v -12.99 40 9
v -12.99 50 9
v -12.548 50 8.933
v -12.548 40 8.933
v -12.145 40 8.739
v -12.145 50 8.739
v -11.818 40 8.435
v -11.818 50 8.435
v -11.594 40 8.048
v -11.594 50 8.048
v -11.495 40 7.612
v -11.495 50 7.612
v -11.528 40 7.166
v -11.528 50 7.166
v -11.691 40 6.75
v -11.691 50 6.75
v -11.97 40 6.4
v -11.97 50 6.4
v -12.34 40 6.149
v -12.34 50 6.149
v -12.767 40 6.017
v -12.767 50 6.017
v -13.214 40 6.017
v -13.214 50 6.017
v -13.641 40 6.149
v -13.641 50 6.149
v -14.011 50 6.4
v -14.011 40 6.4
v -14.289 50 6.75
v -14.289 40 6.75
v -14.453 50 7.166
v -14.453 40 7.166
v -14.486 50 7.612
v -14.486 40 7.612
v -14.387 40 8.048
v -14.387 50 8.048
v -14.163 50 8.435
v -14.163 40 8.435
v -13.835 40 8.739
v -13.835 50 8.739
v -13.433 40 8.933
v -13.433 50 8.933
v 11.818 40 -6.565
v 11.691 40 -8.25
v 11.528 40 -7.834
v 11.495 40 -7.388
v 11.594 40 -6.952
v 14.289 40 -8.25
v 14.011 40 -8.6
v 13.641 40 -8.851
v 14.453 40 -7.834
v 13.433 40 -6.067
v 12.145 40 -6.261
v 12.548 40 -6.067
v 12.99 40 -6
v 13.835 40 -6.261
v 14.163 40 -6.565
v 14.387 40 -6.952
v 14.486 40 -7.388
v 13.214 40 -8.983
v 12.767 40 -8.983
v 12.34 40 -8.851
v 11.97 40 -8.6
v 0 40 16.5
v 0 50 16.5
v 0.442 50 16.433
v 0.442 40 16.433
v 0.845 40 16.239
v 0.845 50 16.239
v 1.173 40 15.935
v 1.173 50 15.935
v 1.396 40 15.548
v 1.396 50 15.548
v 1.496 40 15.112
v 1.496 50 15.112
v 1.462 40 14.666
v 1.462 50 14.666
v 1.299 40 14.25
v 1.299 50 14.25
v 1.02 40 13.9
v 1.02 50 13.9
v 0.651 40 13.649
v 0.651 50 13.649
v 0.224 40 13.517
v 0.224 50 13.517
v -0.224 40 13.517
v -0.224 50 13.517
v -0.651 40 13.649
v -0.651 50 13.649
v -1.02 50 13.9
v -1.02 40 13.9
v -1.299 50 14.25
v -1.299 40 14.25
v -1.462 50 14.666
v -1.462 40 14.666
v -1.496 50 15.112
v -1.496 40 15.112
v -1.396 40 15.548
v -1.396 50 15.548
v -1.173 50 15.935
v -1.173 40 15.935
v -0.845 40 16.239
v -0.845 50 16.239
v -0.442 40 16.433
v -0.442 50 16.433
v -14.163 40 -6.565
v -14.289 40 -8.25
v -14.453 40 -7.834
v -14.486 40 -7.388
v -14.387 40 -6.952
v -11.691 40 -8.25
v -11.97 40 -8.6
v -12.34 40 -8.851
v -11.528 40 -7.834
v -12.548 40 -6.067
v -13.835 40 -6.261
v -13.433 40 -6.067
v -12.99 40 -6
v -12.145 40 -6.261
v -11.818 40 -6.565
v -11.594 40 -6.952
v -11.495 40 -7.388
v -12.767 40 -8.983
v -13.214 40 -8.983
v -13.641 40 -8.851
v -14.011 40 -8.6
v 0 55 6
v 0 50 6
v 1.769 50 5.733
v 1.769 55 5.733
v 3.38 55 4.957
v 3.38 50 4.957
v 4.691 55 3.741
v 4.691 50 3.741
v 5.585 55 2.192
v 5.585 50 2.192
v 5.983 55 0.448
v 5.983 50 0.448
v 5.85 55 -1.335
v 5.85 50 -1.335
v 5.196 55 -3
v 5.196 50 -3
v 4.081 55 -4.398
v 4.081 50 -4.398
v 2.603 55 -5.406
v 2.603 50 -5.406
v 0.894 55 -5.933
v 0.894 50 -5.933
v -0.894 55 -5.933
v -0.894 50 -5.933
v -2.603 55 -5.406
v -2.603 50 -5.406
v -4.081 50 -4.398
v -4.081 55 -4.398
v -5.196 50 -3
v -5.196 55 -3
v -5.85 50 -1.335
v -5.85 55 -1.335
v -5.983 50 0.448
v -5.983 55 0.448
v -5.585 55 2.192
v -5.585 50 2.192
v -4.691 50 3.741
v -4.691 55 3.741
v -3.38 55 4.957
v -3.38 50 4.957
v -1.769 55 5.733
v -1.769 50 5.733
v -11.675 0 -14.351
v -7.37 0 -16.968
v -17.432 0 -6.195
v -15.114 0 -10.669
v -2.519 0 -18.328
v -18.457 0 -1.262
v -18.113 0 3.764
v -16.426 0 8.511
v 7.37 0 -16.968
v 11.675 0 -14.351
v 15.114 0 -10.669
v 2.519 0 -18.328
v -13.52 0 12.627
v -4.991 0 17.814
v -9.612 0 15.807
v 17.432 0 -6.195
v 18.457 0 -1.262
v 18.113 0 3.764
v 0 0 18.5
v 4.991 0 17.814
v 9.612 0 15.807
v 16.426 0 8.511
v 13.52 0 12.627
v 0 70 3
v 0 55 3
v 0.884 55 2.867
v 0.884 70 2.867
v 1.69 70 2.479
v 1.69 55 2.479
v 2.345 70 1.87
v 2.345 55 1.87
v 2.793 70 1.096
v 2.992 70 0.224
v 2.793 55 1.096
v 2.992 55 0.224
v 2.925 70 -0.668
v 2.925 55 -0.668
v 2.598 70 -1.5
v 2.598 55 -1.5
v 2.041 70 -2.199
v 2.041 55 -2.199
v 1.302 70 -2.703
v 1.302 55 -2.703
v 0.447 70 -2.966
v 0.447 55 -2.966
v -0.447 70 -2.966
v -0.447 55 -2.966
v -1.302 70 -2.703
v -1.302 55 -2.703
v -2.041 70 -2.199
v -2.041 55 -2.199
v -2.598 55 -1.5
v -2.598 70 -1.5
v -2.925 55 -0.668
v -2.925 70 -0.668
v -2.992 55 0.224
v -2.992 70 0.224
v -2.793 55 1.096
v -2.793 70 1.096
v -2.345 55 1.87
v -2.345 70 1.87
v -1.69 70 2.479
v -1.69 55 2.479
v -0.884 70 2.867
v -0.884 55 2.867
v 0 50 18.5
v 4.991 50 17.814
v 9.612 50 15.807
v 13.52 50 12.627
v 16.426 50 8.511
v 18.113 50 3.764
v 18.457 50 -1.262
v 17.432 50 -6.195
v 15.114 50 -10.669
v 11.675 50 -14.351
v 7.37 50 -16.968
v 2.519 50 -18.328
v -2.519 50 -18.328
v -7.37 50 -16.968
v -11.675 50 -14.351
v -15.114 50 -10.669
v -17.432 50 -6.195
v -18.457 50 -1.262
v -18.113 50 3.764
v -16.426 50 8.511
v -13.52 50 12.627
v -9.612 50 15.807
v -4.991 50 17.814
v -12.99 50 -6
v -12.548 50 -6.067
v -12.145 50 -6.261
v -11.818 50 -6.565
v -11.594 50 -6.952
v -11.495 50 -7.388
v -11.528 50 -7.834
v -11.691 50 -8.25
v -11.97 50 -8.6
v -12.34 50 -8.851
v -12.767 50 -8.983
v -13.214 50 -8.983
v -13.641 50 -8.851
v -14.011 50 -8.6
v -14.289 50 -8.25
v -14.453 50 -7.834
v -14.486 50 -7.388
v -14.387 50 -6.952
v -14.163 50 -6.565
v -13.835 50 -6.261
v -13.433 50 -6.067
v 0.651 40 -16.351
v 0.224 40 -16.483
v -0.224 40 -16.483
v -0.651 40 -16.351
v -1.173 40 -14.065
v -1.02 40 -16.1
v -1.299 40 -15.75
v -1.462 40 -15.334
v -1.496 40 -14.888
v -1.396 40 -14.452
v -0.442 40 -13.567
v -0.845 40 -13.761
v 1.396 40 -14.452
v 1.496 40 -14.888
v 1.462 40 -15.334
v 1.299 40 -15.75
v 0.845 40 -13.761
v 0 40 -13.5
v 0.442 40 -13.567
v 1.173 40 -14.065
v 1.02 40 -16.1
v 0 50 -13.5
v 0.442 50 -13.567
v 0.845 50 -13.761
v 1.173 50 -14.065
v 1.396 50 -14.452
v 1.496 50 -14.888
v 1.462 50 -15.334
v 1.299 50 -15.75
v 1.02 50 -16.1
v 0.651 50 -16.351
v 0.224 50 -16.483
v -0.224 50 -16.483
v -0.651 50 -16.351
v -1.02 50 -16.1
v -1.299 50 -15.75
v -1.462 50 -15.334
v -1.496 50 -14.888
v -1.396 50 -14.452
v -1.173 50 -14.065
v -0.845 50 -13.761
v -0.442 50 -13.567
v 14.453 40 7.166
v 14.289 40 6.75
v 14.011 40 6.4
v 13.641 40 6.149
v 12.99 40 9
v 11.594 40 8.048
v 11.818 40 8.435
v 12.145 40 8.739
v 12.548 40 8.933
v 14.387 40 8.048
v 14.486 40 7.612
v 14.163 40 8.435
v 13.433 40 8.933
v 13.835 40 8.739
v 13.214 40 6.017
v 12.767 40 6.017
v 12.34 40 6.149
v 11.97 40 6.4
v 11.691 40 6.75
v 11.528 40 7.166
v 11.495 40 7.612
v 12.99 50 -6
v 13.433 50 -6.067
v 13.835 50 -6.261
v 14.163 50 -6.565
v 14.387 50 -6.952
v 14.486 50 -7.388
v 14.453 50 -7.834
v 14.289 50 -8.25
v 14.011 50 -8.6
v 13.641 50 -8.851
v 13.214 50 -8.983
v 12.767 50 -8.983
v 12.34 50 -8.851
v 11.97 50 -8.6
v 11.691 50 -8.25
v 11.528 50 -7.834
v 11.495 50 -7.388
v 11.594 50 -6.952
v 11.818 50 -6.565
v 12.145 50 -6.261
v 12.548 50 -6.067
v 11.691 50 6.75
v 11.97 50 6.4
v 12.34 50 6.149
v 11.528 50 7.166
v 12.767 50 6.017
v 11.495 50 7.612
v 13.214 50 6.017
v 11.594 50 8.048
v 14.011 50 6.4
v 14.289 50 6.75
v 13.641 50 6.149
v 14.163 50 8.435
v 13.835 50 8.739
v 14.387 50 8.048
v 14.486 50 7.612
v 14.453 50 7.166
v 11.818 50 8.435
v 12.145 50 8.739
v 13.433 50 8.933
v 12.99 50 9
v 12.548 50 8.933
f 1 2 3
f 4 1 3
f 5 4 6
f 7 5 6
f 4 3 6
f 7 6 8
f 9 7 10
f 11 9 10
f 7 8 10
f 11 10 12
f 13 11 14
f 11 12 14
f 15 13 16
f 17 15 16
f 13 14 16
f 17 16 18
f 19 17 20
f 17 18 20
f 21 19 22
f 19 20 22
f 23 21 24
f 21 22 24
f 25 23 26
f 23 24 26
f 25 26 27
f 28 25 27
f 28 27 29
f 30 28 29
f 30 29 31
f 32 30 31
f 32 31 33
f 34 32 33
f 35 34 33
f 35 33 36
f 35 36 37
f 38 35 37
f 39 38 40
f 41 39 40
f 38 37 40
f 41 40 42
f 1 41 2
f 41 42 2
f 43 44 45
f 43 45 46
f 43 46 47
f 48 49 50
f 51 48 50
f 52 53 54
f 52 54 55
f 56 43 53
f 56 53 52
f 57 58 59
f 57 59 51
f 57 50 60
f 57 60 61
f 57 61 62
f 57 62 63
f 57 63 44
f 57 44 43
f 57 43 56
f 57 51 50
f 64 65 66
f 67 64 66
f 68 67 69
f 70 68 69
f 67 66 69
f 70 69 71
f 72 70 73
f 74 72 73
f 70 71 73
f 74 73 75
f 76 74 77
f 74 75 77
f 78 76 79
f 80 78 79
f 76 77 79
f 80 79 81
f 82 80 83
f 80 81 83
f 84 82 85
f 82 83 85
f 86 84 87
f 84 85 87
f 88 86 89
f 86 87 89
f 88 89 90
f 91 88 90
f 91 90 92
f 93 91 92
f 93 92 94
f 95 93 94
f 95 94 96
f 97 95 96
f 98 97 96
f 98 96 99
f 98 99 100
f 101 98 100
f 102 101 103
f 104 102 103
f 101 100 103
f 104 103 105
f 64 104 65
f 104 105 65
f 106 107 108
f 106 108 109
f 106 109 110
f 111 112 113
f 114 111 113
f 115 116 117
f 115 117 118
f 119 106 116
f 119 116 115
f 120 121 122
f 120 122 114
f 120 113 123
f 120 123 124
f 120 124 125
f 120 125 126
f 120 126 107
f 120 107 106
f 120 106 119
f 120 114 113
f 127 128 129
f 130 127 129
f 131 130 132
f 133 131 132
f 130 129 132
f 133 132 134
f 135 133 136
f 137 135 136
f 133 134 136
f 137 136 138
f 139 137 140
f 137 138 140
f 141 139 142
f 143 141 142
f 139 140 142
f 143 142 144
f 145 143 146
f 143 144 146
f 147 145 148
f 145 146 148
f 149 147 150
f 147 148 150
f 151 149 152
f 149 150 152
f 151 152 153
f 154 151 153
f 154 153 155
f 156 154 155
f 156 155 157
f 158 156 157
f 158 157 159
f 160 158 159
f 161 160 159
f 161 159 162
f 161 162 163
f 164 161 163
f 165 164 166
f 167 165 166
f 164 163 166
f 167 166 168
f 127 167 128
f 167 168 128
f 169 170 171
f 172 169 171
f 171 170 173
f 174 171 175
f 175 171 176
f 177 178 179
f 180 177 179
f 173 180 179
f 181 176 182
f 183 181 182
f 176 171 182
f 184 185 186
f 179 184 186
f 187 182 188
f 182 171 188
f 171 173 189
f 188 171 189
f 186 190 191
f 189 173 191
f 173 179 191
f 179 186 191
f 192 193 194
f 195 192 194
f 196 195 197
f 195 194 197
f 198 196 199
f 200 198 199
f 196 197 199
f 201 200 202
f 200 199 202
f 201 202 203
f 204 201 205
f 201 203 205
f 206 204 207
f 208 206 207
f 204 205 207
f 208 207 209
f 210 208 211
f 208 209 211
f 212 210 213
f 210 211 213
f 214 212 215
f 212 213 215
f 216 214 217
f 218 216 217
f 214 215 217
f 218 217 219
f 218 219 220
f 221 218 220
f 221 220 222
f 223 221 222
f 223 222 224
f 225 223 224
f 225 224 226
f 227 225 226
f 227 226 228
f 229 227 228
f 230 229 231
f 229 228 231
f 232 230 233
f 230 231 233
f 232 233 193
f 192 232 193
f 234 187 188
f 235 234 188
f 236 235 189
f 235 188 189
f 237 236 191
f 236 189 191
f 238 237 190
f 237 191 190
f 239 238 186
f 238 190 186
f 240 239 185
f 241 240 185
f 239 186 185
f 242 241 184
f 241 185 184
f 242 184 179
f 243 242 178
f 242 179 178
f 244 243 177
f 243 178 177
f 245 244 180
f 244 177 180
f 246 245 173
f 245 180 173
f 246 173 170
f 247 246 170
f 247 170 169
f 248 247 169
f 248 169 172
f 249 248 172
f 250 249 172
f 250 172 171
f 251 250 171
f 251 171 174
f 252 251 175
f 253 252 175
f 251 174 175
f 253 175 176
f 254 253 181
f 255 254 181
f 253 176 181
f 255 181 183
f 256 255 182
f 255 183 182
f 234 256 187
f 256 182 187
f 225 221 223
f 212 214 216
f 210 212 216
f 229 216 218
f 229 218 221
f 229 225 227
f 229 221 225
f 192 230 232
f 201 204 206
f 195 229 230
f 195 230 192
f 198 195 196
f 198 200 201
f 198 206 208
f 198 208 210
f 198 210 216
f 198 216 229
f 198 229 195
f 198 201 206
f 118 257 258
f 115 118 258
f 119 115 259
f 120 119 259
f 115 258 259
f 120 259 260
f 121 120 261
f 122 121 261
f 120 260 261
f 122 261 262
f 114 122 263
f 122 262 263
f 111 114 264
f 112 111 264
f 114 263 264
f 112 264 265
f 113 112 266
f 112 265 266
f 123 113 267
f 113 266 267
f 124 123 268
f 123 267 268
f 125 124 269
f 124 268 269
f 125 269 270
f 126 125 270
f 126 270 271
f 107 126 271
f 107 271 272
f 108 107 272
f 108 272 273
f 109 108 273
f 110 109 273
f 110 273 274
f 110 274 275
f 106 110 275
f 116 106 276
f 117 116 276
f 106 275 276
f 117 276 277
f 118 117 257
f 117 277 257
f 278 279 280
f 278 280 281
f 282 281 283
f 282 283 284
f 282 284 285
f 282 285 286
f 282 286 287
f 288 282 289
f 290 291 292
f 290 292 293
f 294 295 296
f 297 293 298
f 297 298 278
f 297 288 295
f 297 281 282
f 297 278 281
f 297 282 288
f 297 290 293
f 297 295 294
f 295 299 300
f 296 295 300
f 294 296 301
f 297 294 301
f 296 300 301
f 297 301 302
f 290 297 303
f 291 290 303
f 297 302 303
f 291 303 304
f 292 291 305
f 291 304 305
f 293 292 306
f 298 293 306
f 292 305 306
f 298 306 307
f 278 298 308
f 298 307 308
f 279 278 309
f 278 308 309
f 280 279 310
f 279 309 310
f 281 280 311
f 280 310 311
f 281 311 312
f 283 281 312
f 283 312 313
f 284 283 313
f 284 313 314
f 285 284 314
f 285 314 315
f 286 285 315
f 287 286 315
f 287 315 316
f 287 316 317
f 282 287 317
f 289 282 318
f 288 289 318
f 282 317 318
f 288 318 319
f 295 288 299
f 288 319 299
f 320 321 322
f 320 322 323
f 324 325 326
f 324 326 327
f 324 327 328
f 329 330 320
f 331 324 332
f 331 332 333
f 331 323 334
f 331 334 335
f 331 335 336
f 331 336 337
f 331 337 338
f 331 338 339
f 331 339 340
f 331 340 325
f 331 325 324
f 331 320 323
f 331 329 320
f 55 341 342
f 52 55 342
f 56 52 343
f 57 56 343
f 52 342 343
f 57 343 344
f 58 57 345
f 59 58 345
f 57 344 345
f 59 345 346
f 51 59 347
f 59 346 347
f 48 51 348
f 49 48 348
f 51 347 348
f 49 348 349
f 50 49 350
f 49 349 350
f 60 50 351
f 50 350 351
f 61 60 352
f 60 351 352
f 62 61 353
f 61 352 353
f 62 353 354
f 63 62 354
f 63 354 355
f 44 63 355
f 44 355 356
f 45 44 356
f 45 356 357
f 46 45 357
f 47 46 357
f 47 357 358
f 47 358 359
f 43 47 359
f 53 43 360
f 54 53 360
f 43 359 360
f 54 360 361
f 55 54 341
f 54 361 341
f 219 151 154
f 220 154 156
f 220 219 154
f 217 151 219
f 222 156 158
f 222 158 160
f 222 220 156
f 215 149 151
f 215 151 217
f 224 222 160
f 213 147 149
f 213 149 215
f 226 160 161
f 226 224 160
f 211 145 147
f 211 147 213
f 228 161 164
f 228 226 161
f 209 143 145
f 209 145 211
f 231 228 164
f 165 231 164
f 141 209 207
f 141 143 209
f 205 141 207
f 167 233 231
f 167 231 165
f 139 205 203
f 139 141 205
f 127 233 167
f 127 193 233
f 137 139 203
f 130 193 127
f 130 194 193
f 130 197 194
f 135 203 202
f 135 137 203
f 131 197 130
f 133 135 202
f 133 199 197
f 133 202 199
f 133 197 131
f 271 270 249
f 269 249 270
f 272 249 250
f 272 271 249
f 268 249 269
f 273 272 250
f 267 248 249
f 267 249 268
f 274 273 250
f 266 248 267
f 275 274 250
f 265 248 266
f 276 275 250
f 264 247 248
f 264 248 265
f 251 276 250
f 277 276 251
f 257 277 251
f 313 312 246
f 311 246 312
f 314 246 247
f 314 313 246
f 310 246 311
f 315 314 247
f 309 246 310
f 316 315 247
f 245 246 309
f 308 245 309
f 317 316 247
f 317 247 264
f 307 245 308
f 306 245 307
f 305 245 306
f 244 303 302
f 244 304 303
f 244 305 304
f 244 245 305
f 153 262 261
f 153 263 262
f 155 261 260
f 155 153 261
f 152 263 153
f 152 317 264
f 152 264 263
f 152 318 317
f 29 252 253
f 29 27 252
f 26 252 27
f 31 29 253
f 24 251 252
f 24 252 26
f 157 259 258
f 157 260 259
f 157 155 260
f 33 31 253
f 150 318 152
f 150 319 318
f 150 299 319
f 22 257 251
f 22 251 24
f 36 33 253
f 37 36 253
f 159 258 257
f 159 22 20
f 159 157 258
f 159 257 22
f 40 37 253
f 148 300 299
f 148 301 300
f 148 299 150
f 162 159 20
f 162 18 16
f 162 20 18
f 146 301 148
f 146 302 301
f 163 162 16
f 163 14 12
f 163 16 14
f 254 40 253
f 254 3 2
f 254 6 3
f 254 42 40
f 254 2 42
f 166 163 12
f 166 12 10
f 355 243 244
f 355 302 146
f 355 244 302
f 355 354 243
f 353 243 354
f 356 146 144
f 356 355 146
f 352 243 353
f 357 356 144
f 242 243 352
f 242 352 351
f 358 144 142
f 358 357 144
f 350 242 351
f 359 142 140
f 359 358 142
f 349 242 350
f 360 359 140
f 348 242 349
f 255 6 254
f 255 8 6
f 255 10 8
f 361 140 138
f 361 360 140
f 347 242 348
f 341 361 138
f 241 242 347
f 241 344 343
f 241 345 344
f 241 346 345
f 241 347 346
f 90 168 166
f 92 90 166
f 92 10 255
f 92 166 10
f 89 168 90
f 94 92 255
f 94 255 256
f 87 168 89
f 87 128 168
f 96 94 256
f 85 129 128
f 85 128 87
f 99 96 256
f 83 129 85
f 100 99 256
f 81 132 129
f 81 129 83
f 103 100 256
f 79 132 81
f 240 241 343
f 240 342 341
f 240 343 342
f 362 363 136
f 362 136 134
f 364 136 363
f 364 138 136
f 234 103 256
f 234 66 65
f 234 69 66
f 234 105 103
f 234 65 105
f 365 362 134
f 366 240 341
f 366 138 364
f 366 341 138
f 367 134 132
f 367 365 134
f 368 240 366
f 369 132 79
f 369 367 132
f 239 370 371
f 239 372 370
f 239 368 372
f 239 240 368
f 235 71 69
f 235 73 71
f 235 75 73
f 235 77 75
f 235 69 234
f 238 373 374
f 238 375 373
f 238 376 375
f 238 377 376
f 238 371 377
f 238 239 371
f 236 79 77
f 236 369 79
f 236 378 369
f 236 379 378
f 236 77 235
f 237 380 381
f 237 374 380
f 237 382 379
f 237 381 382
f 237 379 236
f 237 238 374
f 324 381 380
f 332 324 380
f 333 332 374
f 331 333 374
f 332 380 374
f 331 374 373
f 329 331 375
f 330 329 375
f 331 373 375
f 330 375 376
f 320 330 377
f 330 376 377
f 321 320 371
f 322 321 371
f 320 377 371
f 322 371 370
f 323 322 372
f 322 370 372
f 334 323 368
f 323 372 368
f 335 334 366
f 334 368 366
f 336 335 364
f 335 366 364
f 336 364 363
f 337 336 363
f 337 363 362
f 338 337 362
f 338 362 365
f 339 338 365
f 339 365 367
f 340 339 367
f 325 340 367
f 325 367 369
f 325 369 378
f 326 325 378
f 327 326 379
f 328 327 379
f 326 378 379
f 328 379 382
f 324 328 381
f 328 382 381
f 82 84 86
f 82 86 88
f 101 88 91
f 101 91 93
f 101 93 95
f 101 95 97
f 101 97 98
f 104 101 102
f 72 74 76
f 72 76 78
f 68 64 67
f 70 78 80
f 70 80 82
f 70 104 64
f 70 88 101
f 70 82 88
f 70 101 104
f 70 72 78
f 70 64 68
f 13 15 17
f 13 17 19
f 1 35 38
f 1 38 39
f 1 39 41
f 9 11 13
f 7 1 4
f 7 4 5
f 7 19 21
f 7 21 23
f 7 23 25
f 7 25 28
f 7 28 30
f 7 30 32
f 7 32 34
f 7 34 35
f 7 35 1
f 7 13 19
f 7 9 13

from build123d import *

# Parameters (mm, degrees)
SKETCH1_R           = 18.5
BOSS_EXTRUDE1_DEPTH = 50
SKETCH2_R           = 6
BOSS_EXTRUDE2_DEPTH = 5
SKETCH3_R           = 3
BOSS_EXTRUDE3_DEPTH = 15
SKETCH4_R           = 1.5
CUT_EXTRUDE1_DEPTH  = 10


with BuildPart() as part:
    # Sketch1 → Boss-Extrude1 (new body)
    with BuildSketch(Plane(origin=(0, 0, 0), x_dir=(1, 0, 0), z_dir=(0, 1, 0))):
        with Locations(Location((0, 0, 0), (0, 0, 270))):
            Circle(SKETCH1_R)
    extrude(amount=BOSS_EXTRUDE1_DEPTH)

    # Sketch2 → Boss-Extrude2 (add)
    with BuildSketch(Plane(origin=(0, 50, 0), x_dir=(1, 0, 0), z_dir=(0, 1, 0))):
        with Locations(Location((0, 0, 0), (0, 0, 270))):
            Circle(SKETCH2_R)
    extrude(amount=BOSS_EXTRUDE2_DEPTH)

    # Sketch3 → Boss-Extrude3 (add)
    with BuildSketch(Plane(origin=(0, 55, 0), x_dir=(1, 0, 0), z_dir=(0, 1, 0))):
        with Locations(Location((0, 0, 0), (0, 0, 270))):
            Circle(SKETCH3_R)
    extrude(amount=BOSS_EXTRUDE3_DEPTH)

    # Sketch4 → Cut-Extrude1 (cut)
    with BuildSketch(Plane(origin=(0, 50, 0), x_dir=(1, 0, 0), z_dir=(0, 1, 0))):
        with Locations(Location((0, 15, 0), (0, 0, 270))):
            Circle(SKETCH4_R)
        with Locations(Location((12.990381057, 7.5, 0), (0, 0, 270))):
            Circle(SKETCH4_R)
        with Locations(Location((12.990381057, -7.5, 0), (0, 0, 270))):
            Circle(SKETCH4_R)
        with Locations(Location((0, -15, 0), (0, 0, 270))):
            Circle(SKETCH4_R)
        with Locations(Location((-12.990381057, -7.5, 0), (0, 0, 270))):
            Circle(SKETCH4_R)
        with Locations(Location((-12.990381057, 7.5, 0), (0, 0, 270))):
            Circle(SKETCH4_R)
    extrude(amount=-CUT_EXTRUDE1_DEPTH, mode=Mode.SUBTRACT)


solid = part.part
